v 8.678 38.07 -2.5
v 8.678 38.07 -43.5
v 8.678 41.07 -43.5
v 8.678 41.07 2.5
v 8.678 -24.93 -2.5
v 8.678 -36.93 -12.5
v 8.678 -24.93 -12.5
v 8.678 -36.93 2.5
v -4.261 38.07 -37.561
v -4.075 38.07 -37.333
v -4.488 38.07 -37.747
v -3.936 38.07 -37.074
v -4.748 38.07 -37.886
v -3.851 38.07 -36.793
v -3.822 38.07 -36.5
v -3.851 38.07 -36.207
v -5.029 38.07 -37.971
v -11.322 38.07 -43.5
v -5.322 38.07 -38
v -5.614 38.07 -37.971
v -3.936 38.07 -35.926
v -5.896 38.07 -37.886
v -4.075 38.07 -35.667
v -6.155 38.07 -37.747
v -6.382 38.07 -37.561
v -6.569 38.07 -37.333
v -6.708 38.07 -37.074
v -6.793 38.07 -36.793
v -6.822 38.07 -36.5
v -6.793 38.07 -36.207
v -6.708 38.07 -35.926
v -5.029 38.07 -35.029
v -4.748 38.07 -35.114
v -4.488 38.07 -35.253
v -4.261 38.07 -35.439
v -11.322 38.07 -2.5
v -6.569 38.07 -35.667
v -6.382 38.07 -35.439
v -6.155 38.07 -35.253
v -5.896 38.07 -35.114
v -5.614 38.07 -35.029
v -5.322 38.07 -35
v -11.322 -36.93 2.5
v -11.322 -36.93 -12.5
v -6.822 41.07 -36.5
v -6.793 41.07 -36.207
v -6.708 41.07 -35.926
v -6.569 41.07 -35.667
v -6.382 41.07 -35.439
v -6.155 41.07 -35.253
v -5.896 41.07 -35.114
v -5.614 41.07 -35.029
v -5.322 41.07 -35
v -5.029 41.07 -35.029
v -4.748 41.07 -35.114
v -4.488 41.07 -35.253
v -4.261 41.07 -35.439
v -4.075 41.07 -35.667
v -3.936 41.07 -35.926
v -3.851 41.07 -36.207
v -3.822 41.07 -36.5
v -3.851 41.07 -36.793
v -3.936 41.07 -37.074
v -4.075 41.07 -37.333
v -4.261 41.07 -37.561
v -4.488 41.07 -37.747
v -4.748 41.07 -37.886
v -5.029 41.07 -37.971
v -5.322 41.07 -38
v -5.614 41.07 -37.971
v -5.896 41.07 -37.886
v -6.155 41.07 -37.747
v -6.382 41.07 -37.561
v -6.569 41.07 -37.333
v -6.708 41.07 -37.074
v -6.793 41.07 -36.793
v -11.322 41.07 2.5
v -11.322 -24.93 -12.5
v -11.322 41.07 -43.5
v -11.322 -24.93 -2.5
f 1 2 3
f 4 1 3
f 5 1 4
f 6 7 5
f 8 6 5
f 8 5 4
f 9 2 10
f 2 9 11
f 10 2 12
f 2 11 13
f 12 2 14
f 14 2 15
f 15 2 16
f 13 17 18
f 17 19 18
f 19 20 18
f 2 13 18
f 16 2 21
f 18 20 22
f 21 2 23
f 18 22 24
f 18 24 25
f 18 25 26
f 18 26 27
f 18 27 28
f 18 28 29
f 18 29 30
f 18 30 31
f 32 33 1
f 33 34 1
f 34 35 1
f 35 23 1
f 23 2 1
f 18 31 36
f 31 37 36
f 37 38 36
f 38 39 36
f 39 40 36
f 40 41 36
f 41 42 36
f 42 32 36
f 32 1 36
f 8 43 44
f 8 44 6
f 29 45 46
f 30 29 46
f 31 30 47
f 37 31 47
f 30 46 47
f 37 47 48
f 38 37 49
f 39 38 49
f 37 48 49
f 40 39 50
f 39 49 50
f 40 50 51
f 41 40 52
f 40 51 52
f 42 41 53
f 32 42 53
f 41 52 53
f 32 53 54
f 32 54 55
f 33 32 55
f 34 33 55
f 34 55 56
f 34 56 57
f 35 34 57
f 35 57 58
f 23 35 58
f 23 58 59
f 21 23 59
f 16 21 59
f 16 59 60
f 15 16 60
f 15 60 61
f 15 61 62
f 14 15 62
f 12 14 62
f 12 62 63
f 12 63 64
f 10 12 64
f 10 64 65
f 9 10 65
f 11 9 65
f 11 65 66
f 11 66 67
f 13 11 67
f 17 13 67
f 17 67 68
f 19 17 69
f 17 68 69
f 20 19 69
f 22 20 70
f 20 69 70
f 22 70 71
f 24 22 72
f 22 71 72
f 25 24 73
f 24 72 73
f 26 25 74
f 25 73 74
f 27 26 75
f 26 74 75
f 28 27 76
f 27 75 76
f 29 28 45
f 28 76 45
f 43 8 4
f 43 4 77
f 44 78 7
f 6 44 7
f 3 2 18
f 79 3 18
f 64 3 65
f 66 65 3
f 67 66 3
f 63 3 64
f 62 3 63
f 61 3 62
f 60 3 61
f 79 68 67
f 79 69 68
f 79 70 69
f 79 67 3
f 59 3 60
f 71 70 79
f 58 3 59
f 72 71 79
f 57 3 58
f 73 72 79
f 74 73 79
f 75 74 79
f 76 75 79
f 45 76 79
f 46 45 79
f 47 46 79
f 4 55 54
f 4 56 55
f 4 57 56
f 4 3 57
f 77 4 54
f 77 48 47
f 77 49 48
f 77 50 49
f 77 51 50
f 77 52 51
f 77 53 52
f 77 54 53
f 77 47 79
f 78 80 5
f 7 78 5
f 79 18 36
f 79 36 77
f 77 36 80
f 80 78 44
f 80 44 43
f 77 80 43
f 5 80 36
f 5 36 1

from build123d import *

# Parameters (mm, degrees)
F0_W     = 20
F0_H     = 63
F1_DEPTH = 2.5
F2_W     = 20
F2_H     = 15
F3_DEPTH = 12
F4_W     = 20
F4_H     = 46
F5_DEPTH = 3
F6_R     = 1.5
F7_DEPTH = 25


with BuildPart() as f1:
    # F0 (on Top) → F1 (new body, symmetric)
    with BuildSketch(Plane.XY):
        with Locations((-1.321708, 6.569935)):
            Rectangle(F0_W, F0_H)
    extrude(amount=F1_DEPTH, both=True)

    # F2 (on face) → F3 (join)
    with BuildSketch(Plane.XZ.offset(24.930065)):
        with Locations((-1.321708, -5)):
            Rectangle(F2_W, F2_H)
    extrude(amount=F3_DEPTH)

    # F4 (on face) → F5 (join)
    with BuildSketch(Plane(origin=(0, 38.069935, 0), x_dir=(-1, 0, 0), z_dir=(0, 1, 0))):
        with Locations((1.321708, -20.5)):
            Rectangle(F4_W, F4_H)
    extrude(amount=F5_DEPTH)

    # F6 (on face) → F7 (cut)
    with BuildSketch(Plane(origin=(0, 41.069935, 0), x_dir=(-1, 0, 0), z_dir=(0, 1, 0))):
        with Locations((5.321708, -36.5)):
            Circle(F6_R)
    extrude(amount=-F7_DEPTH, mode=Mode.SUBTRACT)


solid = f1.part
